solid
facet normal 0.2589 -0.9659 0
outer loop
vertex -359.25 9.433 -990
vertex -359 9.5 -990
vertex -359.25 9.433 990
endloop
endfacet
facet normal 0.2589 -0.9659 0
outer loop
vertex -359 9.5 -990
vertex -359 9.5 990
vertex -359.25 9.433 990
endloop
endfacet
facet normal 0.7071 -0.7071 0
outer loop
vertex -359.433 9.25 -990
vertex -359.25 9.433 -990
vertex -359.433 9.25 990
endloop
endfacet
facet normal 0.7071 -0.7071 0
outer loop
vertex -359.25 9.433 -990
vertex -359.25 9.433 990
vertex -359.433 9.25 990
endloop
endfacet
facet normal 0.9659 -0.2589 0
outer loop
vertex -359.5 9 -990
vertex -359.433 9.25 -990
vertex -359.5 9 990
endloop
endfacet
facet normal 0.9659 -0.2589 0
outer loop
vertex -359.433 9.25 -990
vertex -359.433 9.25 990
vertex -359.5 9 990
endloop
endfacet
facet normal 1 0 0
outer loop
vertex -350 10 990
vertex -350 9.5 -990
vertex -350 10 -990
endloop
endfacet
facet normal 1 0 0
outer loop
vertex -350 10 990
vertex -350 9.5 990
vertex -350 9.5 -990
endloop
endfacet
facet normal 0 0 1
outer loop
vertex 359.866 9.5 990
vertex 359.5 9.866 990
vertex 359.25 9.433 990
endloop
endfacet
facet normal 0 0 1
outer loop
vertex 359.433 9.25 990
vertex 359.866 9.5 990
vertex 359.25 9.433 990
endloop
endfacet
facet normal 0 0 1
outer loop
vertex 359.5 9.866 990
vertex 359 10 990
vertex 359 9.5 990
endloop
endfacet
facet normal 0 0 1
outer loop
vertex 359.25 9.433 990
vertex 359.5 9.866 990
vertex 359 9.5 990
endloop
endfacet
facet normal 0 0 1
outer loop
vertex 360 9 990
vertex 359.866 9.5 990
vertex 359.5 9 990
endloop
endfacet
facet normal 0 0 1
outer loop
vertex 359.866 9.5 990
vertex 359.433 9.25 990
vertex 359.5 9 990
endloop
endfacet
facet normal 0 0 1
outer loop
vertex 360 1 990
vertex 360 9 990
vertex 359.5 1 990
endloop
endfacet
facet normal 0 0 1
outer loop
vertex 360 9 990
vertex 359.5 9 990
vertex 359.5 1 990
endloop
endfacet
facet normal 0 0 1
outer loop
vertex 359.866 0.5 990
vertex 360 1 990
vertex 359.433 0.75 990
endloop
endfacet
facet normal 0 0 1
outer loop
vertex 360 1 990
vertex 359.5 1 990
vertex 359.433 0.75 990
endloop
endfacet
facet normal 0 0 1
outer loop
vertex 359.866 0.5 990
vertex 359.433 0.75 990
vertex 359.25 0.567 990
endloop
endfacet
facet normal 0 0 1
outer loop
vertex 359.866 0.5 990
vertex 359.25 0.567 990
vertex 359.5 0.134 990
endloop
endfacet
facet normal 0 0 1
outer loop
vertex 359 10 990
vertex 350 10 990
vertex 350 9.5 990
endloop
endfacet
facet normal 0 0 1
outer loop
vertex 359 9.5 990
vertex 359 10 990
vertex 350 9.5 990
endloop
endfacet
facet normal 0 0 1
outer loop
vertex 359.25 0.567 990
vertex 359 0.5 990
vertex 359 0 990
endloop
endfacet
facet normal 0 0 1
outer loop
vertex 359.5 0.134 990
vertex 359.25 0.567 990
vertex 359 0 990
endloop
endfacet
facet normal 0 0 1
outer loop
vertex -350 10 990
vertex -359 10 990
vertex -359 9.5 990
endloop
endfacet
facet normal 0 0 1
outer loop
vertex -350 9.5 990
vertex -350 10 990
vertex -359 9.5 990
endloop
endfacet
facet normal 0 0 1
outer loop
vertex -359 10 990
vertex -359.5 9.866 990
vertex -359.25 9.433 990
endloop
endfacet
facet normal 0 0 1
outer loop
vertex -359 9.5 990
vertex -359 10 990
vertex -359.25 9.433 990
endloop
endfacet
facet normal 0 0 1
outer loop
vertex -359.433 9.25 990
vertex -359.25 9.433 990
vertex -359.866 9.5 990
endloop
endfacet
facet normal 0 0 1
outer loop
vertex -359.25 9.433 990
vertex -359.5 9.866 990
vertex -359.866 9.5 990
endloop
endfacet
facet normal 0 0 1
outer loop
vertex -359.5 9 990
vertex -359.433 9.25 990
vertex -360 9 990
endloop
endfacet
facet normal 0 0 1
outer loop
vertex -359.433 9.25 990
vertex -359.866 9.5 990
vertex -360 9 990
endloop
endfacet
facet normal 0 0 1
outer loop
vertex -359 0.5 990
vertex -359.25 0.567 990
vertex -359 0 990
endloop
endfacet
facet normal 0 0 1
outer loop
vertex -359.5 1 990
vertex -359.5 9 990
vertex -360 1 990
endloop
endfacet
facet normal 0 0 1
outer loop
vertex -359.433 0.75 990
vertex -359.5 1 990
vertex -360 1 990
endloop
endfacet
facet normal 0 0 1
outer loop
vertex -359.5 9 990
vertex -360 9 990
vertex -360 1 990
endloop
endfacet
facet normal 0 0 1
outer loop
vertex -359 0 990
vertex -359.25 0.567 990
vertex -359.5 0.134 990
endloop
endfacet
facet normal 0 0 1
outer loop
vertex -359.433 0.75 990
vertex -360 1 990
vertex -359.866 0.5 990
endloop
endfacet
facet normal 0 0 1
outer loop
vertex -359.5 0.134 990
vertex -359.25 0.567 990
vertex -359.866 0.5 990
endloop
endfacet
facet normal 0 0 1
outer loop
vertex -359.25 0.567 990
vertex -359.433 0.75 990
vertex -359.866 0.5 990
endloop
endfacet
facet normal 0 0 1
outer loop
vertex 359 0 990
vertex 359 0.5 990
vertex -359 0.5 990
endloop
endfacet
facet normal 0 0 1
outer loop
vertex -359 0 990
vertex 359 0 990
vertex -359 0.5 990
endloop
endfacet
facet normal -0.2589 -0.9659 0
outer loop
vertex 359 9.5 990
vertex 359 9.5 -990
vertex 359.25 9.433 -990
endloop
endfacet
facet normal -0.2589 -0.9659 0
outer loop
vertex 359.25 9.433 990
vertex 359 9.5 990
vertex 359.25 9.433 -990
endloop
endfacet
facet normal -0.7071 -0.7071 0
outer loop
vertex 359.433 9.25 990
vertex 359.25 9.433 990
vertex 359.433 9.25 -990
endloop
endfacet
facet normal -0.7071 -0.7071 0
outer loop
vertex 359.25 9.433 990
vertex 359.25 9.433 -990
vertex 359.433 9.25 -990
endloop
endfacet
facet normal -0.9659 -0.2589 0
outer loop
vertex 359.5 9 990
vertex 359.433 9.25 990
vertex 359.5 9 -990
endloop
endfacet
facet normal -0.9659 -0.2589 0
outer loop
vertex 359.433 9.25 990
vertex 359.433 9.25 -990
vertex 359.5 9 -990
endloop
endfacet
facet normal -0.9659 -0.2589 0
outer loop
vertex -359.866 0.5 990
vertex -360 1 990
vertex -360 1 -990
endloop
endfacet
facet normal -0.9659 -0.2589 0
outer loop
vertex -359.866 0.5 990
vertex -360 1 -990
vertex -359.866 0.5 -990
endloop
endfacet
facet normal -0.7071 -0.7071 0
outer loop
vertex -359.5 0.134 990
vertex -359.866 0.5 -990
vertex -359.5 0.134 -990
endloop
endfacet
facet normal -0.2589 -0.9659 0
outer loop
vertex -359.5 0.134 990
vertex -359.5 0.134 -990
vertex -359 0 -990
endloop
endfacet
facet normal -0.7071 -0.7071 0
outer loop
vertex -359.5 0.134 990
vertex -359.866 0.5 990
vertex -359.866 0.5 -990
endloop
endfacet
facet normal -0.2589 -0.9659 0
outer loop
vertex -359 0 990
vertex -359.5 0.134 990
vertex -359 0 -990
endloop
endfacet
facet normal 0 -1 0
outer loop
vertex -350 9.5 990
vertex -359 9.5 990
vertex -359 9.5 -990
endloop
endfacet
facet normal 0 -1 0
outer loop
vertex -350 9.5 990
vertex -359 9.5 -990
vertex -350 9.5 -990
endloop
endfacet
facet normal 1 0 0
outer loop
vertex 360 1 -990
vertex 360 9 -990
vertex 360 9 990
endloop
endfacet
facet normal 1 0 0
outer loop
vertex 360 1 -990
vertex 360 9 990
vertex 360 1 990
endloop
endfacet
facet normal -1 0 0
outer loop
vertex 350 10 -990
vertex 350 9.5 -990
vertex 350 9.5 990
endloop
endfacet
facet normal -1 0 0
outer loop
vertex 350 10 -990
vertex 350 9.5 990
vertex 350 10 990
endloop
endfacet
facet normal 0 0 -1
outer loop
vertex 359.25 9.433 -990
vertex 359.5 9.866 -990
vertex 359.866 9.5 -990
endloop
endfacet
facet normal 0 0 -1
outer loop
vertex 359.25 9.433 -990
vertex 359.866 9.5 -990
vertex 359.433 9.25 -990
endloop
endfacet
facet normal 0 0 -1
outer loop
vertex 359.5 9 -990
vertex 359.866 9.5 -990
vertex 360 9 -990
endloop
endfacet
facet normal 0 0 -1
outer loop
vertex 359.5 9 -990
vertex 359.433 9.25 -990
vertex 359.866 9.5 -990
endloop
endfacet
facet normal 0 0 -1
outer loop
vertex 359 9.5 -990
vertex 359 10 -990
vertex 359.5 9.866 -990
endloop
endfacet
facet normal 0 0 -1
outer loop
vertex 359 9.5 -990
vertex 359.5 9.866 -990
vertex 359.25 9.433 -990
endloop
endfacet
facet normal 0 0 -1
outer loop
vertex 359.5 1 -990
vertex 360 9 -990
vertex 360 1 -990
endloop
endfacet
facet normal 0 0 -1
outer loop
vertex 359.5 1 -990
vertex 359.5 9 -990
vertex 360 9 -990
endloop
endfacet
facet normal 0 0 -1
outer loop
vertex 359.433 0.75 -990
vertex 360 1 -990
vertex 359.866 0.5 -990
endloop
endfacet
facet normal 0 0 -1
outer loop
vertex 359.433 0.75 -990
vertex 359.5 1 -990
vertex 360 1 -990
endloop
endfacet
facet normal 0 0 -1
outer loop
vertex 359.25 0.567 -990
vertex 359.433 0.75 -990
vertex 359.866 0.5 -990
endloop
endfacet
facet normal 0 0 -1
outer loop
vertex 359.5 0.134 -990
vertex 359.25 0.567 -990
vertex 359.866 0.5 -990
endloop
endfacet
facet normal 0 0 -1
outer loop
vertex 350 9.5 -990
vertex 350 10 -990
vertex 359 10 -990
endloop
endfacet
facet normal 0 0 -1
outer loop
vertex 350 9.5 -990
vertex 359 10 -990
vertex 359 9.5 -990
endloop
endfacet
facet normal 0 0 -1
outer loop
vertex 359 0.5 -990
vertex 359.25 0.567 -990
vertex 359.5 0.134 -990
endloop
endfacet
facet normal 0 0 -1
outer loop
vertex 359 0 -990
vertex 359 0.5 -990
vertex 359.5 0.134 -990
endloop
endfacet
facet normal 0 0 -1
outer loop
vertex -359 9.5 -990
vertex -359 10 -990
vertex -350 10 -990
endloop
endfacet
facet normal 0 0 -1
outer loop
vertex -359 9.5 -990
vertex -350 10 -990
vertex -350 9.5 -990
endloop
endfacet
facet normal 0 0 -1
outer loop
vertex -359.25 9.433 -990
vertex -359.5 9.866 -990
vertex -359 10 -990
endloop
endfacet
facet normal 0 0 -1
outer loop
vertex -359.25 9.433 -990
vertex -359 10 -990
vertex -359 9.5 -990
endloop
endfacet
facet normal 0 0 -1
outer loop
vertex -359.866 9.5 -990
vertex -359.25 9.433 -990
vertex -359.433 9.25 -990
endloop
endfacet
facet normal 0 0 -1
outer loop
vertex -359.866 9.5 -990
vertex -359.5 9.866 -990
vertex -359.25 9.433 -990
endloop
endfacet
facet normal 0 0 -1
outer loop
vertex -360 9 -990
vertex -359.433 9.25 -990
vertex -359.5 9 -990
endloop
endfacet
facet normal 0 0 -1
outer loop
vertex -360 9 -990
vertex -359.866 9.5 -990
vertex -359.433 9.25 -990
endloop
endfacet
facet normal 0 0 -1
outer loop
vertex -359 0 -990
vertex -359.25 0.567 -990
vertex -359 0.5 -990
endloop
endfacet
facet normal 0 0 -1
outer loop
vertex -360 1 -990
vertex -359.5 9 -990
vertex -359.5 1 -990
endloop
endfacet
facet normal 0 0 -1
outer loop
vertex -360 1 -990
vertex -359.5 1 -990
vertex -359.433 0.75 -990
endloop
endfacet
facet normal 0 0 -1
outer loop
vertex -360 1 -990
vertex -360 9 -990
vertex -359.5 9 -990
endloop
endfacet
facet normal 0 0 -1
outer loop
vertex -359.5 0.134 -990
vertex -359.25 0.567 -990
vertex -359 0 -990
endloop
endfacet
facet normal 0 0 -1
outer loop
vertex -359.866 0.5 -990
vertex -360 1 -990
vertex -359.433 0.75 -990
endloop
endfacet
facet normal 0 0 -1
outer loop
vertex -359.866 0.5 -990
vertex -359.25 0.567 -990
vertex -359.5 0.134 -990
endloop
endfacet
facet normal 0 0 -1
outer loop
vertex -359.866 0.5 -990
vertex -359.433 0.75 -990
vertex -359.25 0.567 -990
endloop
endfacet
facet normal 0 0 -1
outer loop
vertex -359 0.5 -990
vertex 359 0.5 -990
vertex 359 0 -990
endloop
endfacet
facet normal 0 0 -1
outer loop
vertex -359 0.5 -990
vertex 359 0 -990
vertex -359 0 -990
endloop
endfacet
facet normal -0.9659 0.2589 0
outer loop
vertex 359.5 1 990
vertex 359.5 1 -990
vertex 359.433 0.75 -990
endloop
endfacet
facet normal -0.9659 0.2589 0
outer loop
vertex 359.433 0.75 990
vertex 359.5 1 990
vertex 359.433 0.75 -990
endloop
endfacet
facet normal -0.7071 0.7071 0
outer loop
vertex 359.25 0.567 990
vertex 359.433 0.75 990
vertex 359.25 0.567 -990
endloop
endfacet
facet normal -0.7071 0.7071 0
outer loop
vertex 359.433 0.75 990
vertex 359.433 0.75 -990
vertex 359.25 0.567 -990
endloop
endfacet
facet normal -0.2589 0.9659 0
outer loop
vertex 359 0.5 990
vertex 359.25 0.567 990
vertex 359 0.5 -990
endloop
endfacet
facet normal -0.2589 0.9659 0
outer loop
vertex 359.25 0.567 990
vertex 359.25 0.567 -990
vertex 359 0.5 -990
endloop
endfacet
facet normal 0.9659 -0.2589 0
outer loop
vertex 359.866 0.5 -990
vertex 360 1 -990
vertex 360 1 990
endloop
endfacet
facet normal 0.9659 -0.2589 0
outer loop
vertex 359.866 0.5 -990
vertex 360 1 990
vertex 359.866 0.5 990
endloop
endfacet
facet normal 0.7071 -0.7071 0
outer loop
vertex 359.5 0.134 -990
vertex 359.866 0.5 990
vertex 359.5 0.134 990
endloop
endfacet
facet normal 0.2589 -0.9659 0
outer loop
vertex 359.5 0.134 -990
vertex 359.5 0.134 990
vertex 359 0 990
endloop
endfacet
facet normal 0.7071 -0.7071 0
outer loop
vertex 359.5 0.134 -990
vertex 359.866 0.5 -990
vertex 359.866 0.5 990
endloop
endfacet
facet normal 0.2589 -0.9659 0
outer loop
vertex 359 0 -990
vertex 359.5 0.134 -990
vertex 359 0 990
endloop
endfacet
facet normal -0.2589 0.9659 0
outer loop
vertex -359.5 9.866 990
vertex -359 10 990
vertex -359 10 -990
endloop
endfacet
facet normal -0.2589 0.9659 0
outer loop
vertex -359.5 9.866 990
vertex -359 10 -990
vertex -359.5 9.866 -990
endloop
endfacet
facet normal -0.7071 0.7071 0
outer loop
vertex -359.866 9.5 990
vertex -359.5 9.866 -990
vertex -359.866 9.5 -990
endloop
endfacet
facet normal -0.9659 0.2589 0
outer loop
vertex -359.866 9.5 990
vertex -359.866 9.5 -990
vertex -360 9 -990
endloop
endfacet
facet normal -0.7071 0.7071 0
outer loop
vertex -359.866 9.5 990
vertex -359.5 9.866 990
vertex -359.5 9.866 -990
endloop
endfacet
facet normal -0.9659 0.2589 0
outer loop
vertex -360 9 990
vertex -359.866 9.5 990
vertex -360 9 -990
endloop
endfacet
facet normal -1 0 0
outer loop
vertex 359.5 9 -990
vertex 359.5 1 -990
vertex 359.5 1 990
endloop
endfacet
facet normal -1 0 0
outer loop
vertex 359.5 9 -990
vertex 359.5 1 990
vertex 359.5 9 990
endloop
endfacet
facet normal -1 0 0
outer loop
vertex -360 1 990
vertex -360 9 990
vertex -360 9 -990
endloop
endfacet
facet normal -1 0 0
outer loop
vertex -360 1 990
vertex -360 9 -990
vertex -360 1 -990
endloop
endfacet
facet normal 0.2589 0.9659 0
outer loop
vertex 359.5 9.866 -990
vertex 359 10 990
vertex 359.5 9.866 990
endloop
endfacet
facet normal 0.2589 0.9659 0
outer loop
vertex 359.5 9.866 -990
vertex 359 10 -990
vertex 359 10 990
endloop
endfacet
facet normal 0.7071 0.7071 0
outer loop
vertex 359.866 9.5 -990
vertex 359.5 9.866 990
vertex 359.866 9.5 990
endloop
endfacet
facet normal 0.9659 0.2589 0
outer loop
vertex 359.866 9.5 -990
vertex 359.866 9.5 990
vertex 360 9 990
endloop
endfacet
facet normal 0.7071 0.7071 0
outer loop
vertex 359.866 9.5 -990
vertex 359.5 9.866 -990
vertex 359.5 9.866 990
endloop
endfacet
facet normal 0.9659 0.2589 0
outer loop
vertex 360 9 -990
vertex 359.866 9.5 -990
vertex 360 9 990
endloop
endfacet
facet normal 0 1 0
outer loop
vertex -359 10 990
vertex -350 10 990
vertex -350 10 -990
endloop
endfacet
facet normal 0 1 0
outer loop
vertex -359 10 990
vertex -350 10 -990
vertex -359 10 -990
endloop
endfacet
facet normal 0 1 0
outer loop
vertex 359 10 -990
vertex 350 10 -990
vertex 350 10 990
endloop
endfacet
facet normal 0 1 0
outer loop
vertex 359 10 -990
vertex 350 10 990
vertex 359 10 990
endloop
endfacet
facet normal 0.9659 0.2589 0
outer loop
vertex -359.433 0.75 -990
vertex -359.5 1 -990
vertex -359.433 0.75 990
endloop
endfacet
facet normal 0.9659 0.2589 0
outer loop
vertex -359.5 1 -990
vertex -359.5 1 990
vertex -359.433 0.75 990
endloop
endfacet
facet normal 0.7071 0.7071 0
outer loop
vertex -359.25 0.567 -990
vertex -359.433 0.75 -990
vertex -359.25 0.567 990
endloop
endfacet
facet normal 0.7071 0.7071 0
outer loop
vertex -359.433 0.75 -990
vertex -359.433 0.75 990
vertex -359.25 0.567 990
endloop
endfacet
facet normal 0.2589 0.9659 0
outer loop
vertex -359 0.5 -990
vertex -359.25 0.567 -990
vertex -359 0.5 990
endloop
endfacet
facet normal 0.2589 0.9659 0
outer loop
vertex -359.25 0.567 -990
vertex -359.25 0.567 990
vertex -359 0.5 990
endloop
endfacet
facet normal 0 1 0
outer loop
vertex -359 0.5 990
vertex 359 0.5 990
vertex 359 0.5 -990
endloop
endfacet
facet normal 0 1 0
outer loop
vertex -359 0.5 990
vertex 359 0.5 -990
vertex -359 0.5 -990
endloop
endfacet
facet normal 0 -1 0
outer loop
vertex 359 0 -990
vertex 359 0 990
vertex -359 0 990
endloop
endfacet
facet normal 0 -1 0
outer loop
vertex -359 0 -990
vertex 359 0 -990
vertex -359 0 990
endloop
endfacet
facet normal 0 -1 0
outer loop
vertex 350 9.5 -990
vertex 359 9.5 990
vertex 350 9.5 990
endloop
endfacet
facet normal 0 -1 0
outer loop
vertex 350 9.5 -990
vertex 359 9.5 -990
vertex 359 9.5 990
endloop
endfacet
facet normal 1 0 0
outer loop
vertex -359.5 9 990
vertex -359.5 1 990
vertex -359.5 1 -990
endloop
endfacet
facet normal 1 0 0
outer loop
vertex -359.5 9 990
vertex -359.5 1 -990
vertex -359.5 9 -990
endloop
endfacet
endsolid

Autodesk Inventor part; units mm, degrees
ref_plane "YZ Plane" through (0, 0, 0) normal (1, 0, 0) x (0, 1, 0)
ref_plane "XZ Plane" through (0, 0, 0) normal (0, 1, 0) x (-1, 0, 0)
ref_plane "XY Plane" through (0, 0, 0) normal (0, 0, 1) x (1, 0, 0)
sketch "Sketch6" plane through (0, 0, 0) normal (0, 1, 0) x (-1, 0, 0)
  line L0 (360, -990) -> (-360, -990)
  line L1 (-360, -990) -> (-360, 990)
  line L2 (-360, 990) -> (360, 990)
  line L3 (360, 990) -> (360, -990)
  line L4 (360, -990) -> (-360, 990) construction
  line L5 (-360, -990) -> (360, 990) construction
  point P0 (0, 0)
  dimension "d52" = 720
  dimension "d53" = 1980
extrude "Plate2" add sketch "Sketch6" along normal blind 0.5
sketch "Sketch11" plane through (-359.5, 0, 990) normal (-1, 0, 0) x (0, -1, 0)
  line L0 (0, -1980) -> (0, 0)
  line L1 (0, 0) -> (-10, 0)
  line L2 (-10, 0) -> (-10, -1980)
  line L3 (-10, -1980) -> (0, -1980)
edge flange "Flange2" height 10 angle 90 thickness 0.5 bend radius 0.5 thickness toward (-1, 0, 0) relief tear relief width 0.5 relief depth 0.25 edges at (-360, 0.5, 0) wall of the first edge with corners at (-359.5, 0, -990) (-359.5, 0, 990) (-359.5, 10, 990) (-359.5, 10, -990)
bend "Bend3"
corner "Corner3"
sketch "Sketch12" plane through (-360, 9.5, 990) normal (0, 1, 0) x (-1, 0, 0)
  line L0 (0, -1980) -> (0, 0)
  line L1 (0, 0) -> (-10, 0)
  line L2 (-10, 0) -> (-10, -1980)
  line L3 (-10, -1980) -> (0, -1980)
edge flange "Flange3" height 10 angle 90 thickness 0.5 bend radius 0.5 thickness toward (0, 1, 0) relief tear relief width 0.5 relief depth 0.25 edges at (-359.5, 10, 0) wall of the first edge with corners at (-360, 9.5, -990) (-360, 9.5, 990) (-350, 9.5, 990) (-350, 9.5, -990)
bend "Bend4"
corner "Corner4"
sketch "Sketch13" plane through (359.5, 0, -990) normal (1, 0, 0) x (0, 1, 0)
  line L0 (0, 1980) -> (0, 0)
  line L1 (0, 0) -> (10, 0)
  line L2 (10, 0) -> (10, 1980)
  line L3 (10, 1980) -> (0, 1980)
edge flange "Flange4" height 10 angle 90 thickness 0.5 bend radius 0.5 thickness toward (1, 0, 0) relief tear relief width 0.5 relief depth 0.25 edges at (360, 0.5, 0) wall of the first edge with corners at (359.5, 0, 990) (359.5, 0, -990) (359.5, 10, -990) (359.5, 10, 990)
bend "Bend5"
corner "Corner5"
sketch "Sketch14" plane through (360, 9.5, -990) normal (0, 1, 0) x (-1, 0, 0)
  line L0 (0, 1980) -> (0, 0)
  line L1 (0, 0) -> (10, 0)
  line L2 (10, 0) -> (10, 1980)
  line L3 (10, 1980) -> (0, 1980)
edge flange "Flange5" height 10 angle 90 thickness 0.5 bend radius 0.5 thickness toward (0, 1, 0) relief tear relief width 0.5 relief depth 0.25 edges at (359.5, 10, 0) wall of the first edge with corners at (360, 9.5, 990) (360, 9.5, -990) (350, 9.5, -990) (350, 9.5, 990)
bend "Bend6"
corner "Corner6"
equation "\"d53\" = ЖАБРЫ_базовая_длина_дл_лист"
equation "\"d54\" = Thickness"
equation "\"d84\" = BendReliefWidth"
equation "\"d85\" = BendReliefDepth"
equation "\"d86\" = MinimumRemnant"
equation "\"d87\" = TransitionRadius"
equation "\"d90\" = BendRadius"
equation "\"d91\" = CornerReliefSize"
equation "\"d92\" = GapSize"
equation "\"d93\" = JacobiRadiusSize"
equation "\"d94\" = BendReliefWidth"
equation "\"d95\" = BendReliefDepth"
equation "\"d96\" = MinimumRemnant"
equation "\"d97\" = TransitionRadius"
equation "\"d100\" = BendRadius"
equation "\"d101\" = CornerReliefSize"
equation "\"d102\" = GapSize"
equation "\"d103\" = JacobiRadiusSize"
equation "\"d104\" = BendReliefWidth"
equation "\"d105\" = BendReliefDepth"
equation "\"d106\" = MinimumRemnant"
equation "\"d107\" = TransitionRadius"
equation "\"d110\" = BendRadius"
equation "\"d111\" = CornerReliefSize"
equation "\"d112\" = GapSize"
equation "\"d113\" = JacobiRadiusSize"
equation "\"d114\" = BendReliefWidth"
equation "\"d115\" = BendReliefDepth"
equation "\"d116\" = MinimumRemnant"
equation "\"d117\" = TransitionRadius"
equation "\"d120\" = BendRadius"
equation "\"d121\" = CornerReliefSize"
equation "\"d122\" = GapSize"
equation "\"d123\" = JacobiRadiusSize"
equation "\"BendRadius\" = Thickness"
equation "\"BendReliefWidth\" = Thickness"
equation "\"BendReliefDepth\" = 0.5 * Thickness"
equation "\"CornerReliefSize\" = 4 * Thickness"
equation "\"MinimumRemnant\" = 2 * Thickness"
equation "\"TransitionRadius\" = BendRadius"
equation "\"JacobiRadiusSize\" = BendRadius"
equation "\"GapSize\" = Thickness"
equation "\"ЖАБРЫ_базовая_длина_дл_лист\" = 1980"
equation "\"Thickness\" = 0.5"
properties part number "MSC 806 sheet gills" material "Stainless Steel"
